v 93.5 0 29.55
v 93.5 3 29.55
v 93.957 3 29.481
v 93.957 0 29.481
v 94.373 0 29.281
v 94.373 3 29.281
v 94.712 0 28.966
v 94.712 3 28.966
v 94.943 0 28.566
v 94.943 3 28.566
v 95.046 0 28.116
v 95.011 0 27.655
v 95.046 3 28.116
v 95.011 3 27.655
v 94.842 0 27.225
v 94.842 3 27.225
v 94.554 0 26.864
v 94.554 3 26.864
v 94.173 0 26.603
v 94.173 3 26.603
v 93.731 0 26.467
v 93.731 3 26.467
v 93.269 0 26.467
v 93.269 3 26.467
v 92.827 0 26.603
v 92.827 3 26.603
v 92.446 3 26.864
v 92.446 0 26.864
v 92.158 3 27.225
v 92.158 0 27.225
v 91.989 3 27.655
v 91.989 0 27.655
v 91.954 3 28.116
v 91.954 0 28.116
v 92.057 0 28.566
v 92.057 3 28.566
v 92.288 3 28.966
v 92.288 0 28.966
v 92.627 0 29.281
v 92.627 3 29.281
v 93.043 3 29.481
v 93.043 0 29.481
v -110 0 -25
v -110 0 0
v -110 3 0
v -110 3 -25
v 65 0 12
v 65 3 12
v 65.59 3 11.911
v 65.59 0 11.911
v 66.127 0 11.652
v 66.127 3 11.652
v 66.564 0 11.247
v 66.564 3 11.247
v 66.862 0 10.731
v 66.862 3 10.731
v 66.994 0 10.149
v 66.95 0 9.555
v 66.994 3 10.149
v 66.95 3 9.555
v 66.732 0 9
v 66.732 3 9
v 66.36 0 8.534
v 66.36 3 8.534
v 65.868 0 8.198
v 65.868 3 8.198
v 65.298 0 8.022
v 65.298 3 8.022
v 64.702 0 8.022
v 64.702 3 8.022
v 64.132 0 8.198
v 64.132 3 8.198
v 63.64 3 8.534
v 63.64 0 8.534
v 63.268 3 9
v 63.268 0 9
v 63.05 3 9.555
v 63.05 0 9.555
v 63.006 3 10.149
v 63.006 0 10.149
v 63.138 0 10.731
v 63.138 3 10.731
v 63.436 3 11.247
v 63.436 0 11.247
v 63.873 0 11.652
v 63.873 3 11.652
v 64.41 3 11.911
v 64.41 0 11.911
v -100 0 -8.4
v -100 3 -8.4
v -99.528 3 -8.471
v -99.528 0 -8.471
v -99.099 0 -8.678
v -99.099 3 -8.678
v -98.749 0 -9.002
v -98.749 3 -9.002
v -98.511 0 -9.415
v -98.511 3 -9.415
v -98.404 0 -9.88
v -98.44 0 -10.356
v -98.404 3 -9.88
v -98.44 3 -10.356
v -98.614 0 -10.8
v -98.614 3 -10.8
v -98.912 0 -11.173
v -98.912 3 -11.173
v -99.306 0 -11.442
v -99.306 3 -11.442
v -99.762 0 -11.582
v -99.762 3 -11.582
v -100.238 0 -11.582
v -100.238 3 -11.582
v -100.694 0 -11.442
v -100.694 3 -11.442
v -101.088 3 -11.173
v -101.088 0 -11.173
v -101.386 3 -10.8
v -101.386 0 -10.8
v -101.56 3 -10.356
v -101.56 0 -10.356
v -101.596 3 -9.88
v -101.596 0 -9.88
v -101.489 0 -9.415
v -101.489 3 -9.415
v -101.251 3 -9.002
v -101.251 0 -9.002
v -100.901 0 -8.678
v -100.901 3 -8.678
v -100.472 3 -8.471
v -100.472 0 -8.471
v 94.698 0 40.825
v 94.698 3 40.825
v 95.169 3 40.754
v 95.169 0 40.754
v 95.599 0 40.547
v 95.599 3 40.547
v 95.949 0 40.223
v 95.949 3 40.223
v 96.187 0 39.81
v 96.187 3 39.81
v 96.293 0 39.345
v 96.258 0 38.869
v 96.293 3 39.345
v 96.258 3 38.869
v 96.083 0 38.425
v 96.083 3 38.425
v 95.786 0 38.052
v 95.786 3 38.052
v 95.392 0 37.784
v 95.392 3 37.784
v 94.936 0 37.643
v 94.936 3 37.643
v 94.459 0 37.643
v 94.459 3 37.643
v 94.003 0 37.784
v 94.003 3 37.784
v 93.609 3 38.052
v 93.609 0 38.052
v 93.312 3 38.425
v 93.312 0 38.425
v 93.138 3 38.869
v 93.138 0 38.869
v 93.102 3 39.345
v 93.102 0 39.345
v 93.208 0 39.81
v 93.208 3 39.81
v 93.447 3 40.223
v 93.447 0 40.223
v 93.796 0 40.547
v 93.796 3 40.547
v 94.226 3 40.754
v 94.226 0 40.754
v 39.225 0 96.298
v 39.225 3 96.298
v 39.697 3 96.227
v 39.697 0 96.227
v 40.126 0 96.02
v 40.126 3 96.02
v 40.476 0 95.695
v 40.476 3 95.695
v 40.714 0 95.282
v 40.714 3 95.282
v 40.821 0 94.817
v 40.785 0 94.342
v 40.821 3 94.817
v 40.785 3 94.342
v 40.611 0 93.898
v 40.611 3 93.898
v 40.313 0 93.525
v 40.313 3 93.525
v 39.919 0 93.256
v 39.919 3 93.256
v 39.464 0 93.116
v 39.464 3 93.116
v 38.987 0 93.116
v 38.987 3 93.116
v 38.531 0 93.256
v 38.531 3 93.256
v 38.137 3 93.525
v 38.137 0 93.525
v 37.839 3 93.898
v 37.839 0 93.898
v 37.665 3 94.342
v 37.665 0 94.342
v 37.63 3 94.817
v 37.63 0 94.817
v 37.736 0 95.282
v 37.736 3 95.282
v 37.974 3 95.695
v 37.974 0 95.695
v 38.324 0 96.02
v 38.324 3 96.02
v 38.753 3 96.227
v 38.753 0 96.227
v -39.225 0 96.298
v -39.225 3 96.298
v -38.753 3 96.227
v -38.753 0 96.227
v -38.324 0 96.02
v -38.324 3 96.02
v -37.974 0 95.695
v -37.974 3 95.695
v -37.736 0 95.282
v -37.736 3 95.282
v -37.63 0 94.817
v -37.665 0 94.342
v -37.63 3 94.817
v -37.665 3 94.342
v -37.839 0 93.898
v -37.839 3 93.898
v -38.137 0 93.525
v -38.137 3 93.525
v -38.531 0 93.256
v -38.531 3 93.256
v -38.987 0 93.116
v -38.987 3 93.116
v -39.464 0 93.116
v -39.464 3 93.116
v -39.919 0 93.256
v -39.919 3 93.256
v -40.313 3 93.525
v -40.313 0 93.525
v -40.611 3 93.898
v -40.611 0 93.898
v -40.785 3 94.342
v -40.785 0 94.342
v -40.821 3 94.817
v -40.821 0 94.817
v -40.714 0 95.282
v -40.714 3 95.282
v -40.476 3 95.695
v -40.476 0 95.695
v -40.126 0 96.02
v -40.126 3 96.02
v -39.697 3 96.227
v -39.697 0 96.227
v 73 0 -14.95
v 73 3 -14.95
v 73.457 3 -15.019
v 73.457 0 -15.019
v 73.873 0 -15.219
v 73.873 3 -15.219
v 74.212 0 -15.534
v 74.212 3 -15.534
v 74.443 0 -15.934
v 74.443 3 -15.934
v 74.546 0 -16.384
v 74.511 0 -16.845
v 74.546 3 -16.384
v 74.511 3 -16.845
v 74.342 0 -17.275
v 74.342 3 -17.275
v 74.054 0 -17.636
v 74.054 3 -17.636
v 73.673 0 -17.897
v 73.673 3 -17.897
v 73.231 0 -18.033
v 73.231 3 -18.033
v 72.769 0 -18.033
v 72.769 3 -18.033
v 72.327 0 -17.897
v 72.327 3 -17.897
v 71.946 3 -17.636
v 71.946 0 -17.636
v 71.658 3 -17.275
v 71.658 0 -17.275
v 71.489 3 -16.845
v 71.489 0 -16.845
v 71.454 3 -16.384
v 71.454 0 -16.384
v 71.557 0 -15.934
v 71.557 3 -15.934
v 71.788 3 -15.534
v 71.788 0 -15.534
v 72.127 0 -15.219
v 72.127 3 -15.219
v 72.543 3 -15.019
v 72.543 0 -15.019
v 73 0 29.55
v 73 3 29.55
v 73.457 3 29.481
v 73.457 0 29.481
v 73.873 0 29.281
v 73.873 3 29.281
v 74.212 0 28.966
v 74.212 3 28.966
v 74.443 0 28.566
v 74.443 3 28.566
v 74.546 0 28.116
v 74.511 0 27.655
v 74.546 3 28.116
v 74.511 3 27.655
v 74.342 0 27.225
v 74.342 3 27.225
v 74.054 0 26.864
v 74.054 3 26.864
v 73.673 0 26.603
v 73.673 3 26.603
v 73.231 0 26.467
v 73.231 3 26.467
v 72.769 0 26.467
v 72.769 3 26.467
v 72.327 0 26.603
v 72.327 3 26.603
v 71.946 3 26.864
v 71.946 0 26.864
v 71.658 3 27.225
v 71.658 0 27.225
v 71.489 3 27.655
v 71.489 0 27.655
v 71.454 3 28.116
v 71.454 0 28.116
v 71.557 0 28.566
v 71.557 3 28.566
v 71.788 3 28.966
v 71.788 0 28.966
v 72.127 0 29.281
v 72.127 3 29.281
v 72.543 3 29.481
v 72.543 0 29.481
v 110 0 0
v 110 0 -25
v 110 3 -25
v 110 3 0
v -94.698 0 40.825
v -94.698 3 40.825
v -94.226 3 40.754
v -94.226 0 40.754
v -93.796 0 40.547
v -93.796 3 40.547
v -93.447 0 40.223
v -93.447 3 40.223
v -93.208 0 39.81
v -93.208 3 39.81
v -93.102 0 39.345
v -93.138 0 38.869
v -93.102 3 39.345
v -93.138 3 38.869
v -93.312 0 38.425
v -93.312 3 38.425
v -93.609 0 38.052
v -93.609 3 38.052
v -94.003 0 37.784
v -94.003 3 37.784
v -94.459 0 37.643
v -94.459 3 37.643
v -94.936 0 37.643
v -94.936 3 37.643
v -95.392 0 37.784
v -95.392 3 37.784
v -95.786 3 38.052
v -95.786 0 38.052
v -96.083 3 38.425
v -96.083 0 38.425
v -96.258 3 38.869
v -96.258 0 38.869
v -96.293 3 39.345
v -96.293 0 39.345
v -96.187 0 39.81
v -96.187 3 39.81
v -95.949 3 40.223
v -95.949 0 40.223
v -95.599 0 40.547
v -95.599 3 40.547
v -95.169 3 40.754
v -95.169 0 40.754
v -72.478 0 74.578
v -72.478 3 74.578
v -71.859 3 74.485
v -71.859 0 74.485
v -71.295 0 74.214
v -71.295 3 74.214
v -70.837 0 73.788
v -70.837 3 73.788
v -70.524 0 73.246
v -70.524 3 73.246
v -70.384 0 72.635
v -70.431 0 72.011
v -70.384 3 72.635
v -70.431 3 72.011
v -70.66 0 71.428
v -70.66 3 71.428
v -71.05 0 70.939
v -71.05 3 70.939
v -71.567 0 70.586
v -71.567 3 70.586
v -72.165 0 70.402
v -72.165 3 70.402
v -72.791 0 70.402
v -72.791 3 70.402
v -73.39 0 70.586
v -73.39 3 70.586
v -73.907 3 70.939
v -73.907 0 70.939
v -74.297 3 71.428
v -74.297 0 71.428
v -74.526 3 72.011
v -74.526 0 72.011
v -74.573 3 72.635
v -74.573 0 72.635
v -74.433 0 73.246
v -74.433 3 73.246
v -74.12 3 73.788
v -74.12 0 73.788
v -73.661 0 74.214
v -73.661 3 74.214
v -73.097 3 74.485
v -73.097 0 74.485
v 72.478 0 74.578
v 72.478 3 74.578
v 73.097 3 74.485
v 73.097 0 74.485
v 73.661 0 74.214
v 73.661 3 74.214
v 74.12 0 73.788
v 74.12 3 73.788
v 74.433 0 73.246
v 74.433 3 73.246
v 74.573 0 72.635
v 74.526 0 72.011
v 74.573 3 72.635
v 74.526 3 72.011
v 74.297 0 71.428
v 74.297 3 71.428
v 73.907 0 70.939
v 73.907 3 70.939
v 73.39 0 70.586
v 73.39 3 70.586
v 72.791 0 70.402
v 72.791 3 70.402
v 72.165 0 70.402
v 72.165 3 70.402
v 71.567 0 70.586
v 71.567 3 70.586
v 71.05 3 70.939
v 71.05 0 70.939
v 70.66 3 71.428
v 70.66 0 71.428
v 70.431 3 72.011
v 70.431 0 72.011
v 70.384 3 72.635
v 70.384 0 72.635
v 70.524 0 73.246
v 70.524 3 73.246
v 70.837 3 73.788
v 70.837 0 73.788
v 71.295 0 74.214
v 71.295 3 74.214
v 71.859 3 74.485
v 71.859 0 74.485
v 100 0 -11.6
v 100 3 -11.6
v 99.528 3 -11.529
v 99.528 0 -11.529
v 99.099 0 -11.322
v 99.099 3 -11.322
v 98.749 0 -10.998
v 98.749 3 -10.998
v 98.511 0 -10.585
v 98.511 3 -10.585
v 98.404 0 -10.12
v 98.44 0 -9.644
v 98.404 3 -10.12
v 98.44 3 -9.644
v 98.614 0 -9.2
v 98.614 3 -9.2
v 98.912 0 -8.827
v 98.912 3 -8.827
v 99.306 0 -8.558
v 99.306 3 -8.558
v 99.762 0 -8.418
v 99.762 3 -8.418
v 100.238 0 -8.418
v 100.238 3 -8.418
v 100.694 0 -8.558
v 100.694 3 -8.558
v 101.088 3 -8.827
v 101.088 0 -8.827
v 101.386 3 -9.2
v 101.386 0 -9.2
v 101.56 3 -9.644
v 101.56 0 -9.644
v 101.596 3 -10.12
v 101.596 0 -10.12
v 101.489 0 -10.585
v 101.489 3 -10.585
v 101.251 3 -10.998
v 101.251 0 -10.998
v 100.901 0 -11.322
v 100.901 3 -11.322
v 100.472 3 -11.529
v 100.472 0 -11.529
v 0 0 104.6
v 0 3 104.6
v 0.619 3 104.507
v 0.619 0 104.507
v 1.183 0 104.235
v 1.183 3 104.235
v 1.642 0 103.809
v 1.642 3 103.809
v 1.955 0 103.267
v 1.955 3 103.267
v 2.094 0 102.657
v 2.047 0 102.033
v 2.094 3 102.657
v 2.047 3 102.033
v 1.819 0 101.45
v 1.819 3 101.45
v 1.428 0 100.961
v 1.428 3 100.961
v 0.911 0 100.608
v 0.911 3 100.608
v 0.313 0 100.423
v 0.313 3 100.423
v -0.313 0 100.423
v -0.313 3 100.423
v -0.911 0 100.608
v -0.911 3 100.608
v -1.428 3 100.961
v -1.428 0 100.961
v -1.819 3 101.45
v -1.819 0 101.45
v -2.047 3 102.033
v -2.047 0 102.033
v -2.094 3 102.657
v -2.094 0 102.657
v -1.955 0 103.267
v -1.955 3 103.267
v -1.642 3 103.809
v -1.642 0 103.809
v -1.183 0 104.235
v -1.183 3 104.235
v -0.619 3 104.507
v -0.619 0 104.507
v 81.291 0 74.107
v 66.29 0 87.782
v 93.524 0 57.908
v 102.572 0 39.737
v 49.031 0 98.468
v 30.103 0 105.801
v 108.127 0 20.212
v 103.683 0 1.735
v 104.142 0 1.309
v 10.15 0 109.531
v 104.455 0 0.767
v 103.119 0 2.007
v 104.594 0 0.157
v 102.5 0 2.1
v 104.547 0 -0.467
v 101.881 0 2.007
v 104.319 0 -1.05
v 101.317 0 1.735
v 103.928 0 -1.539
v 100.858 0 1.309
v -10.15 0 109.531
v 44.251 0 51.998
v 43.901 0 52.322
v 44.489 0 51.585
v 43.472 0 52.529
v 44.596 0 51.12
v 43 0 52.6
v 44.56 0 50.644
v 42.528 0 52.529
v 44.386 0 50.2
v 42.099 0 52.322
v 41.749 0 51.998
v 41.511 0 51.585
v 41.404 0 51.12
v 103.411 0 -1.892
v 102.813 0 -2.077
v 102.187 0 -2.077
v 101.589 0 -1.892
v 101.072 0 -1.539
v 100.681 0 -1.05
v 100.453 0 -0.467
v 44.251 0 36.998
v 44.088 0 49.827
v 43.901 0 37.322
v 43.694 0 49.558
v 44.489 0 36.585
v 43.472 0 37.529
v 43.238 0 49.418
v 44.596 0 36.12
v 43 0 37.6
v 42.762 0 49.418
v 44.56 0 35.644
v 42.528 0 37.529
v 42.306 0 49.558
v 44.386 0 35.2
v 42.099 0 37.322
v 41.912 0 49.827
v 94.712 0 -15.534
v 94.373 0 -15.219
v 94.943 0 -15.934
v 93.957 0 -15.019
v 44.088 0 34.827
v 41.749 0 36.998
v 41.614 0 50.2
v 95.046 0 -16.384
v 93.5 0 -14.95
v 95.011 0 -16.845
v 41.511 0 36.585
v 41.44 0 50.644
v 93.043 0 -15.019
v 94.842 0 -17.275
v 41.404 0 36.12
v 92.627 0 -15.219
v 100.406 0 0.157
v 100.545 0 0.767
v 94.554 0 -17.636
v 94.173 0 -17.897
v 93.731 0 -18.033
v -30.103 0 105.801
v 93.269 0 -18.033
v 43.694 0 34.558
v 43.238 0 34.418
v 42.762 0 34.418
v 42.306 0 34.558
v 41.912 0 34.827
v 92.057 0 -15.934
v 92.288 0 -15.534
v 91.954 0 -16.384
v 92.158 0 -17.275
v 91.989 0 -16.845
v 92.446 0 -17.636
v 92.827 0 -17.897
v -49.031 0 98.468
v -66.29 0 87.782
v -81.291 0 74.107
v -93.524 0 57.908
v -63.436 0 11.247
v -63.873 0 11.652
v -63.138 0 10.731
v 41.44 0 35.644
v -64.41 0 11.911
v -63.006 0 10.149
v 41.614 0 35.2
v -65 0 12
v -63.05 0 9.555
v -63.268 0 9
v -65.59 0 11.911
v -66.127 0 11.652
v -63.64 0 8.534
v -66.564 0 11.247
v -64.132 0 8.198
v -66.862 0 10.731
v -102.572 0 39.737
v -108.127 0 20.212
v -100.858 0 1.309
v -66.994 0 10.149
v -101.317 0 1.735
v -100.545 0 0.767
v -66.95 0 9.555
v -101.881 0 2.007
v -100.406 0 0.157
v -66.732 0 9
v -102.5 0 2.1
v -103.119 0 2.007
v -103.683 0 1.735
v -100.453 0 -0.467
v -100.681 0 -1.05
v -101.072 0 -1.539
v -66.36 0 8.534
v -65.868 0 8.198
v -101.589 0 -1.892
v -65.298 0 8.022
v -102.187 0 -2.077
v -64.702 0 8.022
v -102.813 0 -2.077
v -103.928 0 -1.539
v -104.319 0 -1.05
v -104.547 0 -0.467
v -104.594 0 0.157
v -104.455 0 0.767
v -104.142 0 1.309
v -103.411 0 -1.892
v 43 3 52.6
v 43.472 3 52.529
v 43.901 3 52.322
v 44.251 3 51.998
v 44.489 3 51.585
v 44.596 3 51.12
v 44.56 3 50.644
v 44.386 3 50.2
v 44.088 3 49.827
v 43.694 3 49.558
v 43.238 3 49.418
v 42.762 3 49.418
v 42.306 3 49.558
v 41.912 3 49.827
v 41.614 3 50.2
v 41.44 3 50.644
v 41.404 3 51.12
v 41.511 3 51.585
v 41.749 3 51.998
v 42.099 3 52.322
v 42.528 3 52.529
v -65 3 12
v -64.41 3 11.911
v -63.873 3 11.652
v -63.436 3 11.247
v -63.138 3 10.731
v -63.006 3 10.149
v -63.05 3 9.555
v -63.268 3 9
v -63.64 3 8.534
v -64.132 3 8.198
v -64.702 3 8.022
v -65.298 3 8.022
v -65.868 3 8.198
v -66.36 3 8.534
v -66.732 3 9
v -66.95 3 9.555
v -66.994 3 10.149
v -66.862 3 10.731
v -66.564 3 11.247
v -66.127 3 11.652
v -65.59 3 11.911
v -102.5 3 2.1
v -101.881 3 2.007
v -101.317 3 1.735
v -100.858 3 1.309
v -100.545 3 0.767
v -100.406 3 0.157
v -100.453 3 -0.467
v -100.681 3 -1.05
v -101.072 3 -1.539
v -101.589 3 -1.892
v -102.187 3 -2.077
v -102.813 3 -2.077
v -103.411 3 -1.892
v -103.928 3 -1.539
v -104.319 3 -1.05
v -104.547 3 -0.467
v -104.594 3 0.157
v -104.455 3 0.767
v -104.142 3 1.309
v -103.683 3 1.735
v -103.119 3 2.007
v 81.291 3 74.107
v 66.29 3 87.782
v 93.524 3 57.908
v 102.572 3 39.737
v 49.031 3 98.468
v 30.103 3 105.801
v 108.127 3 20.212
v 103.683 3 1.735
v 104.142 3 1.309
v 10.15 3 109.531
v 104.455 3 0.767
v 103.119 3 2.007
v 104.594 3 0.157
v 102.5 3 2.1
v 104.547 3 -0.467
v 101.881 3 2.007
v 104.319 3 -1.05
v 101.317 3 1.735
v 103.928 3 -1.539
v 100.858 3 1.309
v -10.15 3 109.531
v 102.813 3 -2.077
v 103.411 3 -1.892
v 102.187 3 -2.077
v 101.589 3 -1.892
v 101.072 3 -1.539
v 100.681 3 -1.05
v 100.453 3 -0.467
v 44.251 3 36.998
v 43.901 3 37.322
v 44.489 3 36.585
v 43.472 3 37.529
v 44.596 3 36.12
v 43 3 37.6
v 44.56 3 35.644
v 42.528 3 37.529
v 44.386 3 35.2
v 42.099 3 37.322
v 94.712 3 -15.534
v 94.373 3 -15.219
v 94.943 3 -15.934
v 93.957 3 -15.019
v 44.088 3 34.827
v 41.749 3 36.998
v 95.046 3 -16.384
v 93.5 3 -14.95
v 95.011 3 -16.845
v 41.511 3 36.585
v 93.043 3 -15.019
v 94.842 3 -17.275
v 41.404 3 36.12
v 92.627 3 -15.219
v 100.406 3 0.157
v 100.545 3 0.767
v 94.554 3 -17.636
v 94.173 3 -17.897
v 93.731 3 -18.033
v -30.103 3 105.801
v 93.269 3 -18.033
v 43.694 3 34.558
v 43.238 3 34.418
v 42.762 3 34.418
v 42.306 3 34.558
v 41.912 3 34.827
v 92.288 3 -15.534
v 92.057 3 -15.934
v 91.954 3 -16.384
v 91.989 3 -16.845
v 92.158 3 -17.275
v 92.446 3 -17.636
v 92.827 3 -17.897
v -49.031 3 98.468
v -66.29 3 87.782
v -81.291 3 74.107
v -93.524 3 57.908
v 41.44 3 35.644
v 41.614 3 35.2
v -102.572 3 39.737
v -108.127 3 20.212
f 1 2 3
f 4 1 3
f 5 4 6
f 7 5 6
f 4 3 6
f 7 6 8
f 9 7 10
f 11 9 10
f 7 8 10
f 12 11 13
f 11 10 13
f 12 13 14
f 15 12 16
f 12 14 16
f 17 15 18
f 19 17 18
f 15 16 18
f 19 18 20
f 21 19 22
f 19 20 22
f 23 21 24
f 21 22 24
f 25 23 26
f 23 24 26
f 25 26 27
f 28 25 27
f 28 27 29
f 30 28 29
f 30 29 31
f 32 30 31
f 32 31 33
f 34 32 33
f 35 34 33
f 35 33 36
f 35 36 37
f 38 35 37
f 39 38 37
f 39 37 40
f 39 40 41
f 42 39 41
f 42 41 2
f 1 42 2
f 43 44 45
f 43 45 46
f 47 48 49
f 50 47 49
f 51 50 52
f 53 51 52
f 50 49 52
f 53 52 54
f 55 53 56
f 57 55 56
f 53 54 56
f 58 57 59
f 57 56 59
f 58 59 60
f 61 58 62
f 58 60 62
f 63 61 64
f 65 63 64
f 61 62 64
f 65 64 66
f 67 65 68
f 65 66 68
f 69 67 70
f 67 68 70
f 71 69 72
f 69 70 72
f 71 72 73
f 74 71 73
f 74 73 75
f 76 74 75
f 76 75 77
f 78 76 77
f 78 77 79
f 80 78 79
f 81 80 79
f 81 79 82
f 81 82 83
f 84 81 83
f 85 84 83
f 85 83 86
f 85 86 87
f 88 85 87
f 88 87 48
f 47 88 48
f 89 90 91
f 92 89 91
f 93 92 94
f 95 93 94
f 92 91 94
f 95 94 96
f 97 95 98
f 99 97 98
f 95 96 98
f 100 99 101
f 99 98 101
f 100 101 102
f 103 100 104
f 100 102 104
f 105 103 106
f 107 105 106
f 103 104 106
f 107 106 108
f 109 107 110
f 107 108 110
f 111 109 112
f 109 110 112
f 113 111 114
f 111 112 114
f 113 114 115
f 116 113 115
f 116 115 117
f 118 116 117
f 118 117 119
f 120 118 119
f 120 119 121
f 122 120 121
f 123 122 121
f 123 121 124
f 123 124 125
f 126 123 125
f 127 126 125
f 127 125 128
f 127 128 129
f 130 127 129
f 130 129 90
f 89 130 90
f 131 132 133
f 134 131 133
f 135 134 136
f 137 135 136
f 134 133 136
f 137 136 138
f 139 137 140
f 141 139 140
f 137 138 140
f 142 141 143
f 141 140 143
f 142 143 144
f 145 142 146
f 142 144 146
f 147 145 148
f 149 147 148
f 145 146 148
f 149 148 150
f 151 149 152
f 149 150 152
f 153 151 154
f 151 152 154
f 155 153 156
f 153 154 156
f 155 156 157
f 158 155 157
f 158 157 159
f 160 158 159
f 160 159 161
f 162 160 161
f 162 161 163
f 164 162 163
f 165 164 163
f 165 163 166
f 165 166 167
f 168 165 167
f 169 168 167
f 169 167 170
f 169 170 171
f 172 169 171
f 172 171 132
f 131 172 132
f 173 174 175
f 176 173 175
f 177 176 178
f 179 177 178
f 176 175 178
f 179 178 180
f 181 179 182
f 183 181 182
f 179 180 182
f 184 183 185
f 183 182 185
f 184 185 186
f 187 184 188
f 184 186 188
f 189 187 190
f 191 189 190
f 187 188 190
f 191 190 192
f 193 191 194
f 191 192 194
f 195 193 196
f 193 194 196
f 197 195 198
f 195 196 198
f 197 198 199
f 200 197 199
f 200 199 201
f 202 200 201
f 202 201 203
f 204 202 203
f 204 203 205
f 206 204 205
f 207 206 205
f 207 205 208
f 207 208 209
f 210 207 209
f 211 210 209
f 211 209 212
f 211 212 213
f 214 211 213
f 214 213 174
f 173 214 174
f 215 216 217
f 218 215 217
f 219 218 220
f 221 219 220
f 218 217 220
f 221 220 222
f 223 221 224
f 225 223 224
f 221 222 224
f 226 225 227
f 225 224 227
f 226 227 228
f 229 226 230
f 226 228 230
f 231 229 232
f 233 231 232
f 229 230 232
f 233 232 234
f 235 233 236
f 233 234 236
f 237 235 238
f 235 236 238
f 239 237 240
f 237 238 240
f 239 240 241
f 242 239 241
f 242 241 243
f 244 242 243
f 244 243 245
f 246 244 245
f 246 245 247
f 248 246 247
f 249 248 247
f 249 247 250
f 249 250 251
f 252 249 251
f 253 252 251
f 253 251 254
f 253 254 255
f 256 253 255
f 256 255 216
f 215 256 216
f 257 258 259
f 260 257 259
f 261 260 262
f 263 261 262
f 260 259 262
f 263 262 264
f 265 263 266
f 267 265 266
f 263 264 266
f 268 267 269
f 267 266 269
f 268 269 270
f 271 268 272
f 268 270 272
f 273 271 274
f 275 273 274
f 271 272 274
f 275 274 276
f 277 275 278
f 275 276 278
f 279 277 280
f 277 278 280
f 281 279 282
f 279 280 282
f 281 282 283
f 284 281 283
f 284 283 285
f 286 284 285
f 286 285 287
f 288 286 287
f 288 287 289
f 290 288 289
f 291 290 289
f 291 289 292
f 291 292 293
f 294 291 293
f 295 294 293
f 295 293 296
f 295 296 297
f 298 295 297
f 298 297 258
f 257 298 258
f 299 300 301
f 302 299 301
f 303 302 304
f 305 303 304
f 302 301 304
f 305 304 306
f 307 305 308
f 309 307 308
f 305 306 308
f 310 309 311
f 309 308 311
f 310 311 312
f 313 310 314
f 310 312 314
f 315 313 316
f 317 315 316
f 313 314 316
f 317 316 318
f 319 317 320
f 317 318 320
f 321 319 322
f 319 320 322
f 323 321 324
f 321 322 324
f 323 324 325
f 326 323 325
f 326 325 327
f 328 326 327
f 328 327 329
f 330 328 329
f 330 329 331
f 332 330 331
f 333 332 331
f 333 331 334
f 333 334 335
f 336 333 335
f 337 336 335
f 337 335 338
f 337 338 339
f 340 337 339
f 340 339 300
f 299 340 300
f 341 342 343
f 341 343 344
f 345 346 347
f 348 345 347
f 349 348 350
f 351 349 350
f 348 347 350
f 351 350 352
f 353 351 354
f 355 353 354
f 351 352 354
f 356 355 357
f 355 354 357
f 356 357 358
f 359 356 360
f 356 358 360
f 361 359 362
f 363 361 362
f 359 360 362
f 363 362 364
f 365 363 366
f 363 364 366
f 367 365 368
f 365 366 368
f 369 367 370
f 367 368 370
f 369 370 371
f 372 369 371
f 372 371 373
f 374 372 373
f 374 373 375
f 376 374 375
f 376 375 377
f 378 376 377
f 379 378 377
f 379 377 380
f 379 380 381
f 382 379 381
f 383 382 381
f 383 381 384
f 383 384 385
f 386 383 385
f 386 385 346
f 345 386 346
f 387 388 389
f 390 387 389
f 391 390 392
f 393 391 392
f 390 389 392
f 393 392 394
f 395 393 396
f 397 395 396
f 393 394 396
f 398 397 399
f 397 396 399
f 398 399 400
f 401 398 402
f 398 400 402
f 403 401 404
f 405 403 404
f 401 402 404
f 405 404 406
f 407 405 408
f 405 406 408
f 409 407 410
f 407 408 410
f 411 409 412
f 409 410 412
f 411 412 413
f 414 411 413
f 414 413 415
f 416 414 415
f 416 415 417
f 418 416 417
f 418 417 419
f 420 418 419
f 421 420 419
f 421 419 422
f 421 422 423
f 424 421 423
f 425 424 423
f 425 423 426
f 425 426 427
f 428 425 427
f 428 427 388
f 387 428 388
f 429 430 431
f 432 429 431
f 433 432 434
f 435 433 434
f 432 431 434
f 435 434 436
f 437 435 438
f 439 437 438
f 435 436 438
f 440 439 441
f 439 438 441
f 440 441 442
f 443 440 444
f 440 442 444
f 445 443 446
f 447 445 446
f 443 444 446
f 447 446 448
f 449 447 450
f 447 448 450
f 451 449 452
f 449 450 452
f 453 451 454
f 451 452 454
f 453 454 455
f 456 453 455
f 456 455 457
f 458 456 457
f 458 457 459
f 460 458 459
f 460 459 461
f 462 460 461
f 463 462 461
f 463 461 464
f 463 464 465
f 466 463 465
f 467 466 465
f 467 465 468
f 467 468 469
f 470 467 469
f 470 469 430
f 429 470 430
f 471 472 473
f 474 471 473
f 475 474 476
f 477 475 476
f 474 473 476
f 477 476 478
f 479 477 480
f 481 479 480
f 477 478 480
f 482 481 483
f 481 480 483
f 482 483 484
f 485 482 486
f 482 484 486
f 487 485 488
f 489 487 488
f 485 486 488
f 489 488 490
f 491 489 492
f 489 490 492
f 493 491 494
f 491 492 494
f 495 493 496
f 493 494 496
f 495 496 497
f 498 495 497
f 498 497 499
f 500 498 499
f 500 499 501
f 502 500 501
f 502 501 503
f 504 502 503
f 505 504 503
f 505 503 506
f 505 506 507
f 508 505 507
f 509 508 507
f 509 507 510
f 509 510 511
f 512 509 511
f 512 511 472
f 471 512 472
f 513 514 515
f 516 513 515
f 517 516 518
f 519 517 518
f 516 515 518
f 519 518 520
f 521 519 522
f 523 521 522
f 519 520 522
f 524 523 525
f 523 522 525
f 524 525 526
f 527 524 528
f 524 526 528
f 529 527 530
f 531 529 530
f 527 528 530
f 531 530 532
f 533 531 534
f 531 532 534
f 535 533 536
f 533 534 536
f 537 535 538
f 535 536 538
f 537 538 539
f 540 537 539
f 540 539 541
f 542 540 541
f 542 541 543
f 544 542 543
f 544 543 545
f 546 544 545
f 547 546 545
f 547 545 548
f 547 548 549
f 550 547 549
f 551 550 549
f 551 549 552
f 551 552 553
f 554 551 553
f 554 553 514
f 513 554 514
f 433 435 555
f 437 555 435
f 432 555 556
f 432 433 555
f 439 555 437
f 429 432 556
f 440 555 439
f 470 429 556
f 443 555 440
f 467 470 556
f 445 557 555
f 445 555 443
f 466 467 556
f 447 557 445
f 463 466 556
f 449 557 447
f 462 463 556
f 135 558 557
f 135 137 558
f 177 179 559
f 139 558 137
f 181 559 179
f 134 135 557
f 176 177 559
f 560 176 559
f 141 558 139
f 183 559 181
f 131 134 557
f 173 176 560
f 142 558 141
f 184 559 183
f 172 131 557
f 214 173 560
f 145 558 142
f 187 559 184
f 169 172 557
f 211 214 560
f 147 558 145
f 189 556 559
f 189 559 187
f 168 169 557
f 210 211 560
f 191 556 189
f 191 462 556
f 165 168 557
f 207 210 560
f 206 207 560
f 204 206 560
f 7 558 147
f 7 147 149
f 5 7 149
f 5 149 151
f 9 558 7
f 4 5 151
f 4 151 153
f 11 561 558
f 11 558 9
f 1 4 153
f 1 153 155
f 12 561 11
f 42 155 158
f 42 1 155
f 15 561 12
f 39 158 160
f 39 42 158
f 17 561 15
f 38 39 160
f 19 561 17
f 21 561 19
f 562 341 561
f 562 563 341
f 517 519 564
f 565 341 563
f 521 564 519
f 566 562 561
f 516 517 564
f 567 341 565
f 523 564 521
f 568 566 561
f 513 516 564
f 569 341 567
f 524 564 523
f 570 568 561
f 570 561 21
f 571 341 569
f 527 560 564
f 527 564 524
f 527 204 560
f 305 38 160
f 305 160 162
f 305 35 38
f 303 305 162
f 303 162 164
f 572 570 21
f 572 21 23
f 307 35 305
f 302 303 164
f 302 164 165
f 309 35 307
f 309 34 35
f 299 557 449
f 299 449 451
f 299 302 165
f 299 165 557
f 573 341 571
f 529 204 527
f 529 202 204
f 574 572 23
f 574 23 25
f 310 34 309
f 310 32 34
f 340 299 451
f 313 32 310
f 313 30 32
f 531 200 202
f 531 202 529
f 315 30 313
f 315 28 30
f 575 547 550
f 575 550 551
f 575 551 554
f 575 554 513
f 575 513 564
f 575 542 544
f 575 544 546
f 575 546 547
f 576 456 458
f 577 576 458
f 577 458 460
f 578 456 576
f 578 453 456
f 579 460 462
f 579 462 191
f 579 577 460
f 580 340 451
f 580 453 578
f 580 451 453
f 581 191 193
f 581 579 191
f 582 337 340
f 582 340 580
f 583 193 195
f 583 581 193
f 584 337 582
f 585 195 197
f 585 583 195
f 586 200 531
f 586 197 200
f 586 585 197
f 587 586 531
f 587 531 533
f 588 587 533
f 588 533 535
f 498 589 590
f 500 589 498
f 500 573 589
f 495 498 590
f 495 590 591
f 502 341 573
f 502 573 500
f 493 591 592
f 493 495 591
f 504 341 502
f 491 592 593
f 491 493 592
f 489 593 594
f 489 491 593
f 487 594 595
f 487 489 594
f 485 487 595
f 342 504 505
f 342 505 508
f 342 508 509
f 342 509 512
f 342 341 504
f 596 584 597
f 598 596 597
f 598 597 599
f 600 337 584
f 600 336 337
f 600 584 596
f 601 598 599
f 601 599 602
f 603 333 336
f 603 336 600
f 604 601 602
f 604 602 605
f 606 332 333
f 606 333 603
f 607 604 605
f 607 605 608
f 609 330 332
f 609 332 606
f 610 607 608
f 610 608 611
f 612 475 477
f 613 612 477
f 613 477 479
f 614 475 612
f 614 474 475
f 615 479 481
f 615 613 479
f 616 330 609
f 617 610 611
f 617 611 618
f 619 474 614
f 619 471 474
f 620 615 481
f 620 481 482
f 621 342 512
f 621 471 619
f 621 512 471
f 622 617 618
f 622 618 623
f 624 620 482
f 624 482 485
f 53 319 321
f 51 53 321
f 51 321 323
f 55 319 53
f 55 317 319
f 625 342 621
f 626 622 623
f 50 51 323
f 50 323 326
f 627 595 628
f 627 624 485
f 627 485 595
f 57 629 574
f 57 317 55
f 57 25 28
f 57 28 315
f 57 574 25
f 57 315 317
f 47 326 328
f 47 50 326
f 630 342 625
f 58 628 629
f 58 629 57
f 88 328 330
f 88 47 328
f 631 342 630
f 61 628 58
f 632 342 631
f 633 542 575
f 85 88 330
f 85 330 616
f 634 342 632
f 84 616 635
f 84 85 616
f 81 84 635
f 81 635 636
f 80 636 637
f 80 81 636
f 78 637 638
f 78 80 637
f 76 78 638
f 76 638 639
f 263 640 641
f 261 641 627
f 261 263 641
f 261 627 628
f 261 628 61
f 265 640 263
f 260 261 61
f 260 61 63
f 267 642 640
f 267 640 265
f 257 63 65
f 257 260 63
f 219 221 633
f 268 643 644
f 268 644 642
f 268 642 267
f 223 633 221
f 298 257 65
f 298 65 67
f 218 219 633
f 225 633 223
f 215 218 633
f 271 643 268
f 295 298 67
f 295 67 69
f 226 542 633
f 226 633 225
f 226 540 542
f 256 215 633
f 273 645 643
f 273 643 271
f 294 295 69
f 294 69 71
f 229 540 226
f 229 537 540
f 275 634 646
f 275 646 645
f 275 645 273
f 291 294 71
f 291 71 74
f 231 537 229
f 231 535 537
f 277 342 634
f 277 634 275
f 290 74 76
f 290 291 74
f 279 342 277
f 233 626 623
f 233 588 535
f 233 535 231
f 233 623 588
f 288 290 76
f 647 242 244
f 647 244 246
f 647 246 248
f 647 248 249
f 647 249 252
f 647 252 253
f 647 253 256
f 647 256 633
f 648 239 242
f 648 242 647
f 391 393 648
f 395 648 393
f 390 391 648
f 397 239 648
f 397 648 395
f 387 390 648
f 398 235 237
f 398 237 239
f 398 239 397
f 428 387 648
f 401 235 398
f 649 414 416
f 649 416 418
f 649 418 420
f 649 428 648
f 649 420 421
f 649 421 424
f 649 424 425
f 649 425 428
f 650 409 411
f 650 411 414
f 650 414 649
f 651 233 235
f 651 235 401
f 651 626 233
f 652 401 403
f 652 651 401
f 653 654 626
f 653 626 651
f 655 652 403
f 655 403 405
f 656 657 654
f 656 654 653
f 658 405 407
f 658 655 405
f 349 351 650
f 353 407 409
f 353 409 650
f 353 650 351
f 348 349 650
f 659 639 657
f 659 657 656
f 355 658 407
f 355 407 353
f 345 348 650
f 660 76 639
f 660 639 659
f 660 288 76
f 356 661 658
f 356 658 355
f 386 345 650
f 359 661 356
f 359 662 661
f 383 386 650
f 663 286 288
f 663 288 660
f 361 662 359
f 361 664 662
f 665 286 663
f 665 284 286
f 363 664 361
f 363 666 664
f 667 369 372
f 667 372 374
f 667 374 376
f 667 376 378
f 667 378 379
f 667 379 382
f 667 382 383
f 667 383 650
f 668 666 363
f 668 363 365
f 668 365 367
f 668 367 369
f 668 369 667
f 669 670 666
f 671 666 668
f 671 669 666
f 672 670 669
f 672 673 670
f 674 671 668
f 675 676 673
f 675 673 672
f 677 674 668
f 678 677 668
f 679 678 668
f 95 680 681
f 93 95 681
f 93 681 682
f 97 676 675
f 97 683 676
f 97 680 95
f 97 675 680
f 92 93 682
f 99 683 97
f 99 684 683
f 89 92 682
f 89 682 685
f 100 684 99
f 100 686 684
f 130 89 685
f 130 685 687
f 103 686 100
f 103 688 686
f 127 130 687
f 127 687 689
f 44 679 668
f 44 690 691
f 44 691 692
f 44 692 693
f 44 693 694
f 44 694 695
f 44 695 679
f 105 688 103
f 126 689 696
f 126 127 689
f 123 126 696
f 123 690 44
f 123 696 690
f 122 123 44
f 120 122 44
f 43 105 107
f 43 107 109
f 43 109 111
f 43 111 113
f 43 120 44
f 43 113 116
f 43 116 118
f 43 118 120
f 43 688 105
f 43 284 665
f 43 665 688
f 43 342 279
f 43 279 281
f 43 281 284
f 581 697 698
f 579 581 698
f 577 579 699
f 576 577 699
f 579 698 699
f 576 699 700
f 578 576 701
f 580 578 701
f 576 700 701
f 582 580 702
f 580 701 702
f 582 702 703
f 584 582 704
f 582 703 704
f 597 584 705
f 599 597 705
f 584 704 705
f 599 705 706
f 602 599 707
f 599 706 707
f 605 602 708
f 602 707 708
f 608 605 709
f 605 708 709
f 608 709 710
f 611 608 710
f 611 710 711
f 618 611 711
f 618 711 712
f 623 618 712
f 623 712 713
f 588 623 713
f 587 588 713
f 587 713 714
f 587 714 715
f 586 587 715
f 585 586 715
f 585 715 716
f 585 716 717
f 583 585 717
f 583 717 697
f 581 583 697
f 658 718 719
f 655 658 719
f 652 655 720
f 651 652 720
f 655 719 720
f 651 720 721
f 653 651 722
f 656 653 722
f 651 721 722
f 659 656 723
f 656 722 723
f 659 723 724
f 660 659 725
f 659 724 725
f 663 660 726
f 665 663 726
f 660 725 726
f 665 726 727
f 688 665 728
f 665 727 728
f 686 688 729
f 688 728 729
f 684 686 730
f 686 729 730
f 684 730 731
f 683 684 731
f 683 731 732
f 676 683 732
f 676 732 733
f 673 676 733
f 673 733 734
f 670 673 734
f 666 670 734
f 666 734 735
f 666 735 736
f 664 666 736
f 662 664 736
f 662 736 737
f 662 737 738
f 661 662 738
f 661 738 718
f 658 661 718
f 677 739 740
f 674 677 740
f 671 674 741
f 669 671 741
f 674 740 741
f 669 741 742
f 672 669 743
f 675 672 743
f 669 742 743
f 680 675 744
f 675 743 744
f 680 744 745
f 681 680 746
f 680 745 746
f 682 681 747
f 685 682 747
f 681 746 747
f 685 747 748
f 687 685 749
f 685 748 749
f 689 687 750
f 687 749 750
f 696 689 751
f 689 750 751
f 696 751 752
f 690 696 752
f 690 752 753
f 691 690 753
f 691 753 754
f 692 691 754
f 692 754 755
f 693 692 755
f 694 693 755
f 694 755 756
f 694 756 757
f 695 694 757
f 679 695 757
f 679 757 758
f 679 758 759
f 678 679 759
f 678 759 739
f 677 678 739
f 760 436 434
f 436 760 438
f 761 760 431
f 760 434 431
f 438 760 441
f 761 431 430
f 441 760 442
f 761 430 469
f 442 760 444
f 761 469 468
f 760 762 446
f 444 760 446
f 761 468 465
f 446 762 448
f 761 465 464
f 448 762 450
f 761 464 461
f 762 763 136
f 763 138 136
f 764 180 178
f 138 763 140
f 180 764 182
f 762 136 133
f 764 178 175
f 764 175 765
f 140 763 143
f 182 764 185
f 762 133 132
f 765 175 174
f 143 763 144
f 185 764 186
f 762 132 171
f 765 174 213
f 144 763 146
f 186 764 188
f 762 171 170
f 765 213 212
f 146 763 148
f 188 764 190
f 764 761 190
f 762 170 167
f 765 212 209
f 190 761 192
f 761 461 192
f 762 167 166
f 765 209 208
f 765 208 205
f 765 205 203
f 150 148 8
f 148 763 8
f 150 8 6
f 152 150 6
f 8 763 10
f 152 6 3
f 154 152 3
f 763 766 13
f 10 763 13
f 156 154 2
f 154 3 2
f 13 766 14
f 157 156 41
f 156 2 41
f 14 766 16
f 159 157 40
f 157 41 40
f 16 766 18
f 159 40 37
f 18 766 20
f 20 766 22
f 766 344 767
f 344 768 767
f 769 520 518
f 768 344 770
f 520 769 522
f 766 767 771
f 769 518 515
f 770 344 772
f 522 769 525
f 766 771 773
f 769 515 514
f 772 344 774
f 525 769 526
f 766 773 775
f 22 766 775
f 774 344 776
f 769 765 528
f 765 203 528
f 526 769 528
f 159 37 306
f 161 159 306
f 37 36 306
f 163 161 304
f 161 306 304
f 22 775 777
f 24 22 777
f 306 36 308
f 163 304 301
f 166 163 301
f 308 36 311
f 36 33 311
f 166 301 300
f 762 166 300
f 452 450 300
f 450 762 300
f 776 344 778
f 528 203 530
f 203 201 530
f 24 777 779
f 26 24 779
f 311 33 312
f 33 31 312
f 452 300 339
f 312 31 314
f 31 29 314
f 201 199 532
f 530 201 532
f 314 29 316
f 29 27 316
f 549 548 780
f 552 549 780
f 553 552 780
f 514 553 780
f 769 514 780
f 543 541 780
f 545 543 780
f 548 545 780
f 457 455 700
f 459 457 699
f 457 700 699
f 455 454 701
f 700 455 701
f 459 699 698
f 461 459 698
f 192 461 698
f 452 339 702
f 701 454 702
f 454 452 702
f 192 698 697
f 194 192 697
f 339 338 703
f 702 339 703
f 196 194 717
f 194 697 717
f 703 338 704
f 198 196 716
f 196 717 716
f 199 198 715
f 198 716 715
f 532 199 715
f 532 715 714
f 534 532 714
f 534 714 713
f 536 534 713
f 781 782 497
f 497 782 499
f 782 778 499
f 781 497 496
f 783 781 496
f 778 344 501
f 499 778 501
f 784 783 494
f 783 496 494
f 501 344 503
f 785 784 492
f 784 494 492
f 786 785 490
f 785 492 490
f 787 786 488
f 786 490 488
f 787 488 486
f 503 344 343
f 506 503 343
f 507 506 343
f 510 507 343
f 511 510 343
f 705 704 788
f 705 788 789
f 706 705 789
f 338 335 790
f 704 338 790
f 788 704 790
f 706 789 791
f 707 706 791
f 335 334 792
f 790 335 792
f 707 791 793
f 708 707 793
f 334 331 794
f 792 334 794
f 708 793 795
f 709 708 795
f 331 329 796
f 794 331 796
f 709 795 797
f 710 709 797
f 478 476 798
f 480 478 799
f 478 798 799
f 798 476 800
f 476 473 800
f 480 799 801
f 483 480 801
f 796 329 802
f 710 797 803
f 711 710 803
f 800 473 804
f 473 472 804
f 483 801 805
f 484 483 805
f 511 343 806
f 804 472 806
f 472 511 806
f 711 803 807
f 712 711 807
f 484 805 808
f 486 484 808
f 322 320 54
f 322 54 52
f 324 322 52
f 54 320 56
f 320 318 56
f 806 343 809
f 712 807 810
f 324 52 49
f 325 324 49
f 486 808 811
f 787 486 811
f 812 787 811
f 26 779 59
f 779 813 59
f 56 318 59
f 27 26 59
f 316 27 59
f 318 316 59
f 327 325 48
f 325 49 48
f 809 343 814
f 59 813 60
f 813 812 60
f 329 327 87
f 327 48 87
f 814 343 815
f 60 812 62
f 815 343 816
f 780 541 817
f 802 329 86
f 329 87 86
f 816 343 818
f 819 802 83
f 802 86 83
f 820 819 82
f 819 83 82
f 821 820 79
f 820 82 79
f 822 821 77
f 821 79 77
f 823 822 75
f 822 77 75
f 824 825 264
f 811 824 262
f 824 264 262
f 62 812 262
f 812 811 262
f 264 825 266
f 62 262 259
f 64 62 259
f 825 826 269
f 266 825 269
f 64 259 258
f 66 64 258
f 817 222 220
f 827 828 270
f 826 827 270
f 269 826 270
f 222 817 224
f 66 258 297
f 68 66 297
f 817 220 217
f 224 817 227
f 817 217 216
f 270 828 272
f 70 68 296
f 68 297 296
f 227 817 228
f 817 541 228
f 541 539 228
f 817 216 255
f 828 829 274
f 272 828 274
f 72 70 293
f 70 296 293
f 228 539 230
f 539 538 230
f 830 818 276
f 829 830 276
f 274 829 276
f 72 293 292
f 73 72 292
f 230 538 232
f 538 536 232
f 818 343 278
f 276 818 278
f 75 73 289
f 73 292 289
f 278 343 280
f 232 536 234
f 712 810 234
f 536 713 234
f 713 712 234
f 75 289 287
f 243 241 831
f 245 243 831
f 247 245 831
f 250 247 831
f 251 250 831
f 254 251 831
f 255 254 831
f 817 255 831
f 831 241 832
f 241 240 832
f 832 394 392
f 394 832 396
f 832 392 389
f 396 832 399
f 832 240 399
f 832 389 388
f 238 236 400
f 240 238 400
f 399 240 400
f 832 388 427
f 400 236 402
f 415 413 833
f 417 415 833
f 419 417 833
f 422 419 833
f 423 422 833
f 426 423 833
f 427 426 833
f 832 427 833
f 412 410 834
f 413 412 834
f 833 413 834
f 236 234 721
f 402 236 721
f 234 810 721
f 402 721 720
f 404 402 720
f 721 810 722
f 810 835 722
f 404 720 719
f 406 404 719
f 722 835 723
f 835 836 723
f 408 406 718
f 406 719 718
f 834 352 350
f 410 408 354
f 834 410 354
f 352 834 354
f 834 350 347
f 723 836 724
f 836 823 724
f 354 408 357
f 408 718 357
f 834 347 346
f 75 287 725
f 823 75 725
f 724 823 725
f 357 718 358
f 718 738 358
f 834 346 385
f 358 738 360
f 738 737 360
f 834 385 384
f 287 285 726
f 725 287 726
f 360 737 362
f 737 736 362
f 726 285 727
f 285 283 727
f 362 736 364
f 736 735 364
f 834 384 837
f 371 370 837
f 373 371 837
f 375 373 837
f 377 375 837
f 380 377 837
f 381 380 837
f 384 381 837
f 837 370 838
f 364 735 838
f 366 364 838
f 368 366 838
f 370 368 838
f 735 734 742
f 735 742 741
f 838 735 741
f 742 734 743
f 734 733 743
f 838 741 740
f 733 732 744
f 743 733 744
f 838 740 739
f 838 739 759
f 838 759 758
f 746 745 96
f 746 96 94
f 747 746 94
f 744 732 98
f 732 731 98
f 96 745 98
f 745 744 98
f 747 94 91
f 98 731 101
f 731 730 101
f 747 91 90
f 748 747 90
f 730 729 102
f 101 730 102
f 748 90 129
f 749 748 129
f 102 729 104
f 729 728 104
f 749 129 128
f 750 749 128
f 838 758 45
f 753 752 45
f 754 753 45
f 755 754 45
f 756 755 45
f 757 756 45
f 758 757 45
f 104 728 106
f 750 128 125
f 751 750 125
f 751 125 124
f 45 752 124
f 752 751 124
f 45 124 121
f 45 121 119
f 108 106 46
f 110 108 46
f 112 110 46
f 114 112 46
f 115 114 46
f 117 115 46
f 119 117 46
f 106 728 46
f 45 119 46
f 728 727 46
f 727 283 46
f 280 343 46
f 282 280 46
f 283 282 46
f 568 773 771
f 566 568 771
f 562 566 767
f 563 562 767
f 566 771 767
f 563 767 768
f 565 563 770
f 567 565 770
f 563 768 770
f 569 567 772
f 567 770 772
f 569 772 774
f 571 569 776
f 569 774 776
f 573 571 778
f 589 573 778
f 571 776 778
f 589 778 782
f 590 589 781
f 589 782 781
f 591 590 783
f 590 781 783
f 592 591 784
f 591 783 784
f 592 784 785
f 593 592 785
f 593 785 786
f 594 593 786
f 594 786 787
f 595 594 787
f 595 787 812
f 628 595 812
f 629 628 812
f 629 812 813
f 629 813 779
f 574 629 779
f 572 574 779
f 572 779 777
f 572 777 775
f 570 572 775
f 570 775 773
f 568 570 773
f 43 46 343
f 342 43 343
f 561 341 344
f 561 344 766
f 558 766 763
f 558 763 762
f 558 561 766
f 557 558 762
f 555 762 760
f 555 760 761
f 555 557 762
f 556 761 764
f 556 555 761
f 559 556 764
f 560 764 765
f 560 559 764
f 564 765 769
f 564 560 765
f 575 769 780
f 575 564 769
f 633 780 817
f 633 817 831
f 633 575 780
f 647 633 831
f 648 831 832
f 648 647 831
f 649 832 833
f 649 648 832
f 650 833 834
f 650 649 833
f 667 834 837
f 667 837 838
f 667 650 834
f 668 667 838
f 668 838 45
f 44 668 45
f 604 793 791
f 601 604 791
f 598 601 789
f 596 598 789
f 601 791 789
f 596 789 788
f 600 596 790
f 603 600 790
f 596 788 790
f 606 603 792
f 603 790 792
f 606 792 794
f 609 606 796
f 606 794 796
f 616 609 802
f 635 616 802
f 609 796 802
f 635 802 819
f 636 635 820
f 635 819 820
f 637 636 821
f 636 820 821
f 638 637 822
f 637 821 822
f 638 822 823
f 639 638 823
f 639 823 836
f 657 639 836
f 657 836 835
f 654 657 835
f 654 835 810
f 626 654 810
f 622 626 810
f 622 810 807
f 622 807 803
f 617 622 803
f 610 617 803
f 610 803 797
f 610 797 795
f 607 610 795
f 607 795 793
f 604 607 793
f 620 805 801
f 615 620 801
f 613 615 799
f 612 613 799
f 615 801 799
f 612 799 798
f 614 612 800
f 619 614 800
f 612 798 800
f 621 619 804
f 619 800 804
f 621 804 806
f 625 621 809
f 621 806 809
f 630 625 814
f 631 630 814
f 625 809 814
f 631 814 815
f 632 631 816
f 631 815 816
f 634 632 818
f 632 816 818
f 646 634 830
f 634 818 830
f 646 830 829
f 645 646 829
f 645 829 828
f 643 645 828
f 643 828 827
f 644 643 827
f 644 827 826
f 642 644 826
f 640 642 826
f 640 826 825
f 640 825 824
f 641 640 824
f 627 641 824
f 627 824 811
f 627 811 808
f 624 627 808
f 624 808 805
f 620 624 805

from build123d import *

# Parameters (mm, degrees)
EXTRUDE_1_DEPTH     = 3
SKETCH_2_W          = 220
SKETCH_2_H          = 200
CUT_EXTRUDE_1_DEPTH = 167.535281547
SKETCH_3_R          = 2
SKETCH_3_R_2        = 2.1
SKETCH_3_R_3        = 1.6
CUT_EXTRUDE_2_DEPTH = 10
SKETCH_4_R          = 1.6
CUT_EXTRUDE_3_DEPTH = 156.592416268
SKETCH_4_3_R        = 1.6
SKETCH_4_3_R_2      = 1.55
CUT_EXTRUDE_4_DEPTH = 10


with BuildPart() as part:
    # 草图1 → 凸台-拉伸1 (new body)
    with BuildSketch(Plane(origin=(0, 0, 0), x_dir=(1, 0, 0), z_dir=(0, 1, 0))):
        with BuildLine():
            Line((-110, 0), (-110, 125))
            Line((-110, 125), (110, 125))
            Line((110, 125), (110, 0))
            ThreePointArc((110, 0), (0, -110), (-110, 0))
        make_face()
    extrude(amount=EXTRUDE_1_DEPTH)

    # 草图2 → 切除-拉伸1 (cut, through all)
    with BuildSketch(Plane(origin=(0, 3, 0), x_dir=(1, 0, 0), z_dir=(0, 1, 0))):
        with Locations((0, 125)):
            Rectangle(SKETCH_2_W, SKETCH_2_H)
    extrude(amount=-CUT_EXTRUDE_1_DEPTH, mode=Mode.SUBTRACT)

    # 草图3 → 切除-拉伸2 (cut)
    with BuildSketch(Plane(origin=(0, 3, 0), x_dir=(1, 0, 0), z_dir=(0, 1, 0))):
        with Locations((-65, -10)):
            Circle(SKETCH_3_R)
        with Locations((65, -10)):
            Circle(SKETCH_3_R)
        with Locations((0, -102.5)):
            Circle(SKETCH_3_R_2)
        with Locations((-72.478445072, -72.478445072)):
            Circle(SKETCH_3_R_2)
        with Locations((-102.5, 0)):
            Circle(SKETCH_3_R_2)
        with Locations((102.5, 0)):
            Circle(SKETCH_3_R_2)
        with Locations((72.478445072, -72.478445072)):
            Circle(SKETCH_3_R_2)
        with Locations((-94.697652082, -39.225051817)):
            Circle(SKETCH_3_R_3)
        with Locations((94.697652082, -39.225051817)):
            Circle(SKETCH_3_R_3)
        with Locations((39.225051817, -94.697652082)):
            Circle(SKETCH_3_R_3)
        with Locations((-39.225051817, -94.697652082)):
            Circle(SKETCH_3_R_3)
    extrude(amount=-CUT_EXTRUDE_2_DEPTH, mode=Mode.SUBTRACT)

    # 草图4 → 切除-拉伸3 (cut, through all)
    with BuildSketch(Plane(origin=(0, 3, 0), x_dir=(1, 0, 0), z_dir=(0, 1, 0))):
        with Locations((-100, 10)):
            Circle(SKETCH_4_R)
        with Locations((100, 10)):
            Circle(SKETCH_4_R)
    extrude(amount=-CUT_EXTRUDE_3_DEPTH, mode=Mode.SUBTRACT)

    # 草图4<3> → 切除-拉伸4 (cut)
    with BuildSketch(Plane(origin=(0, 3, 0), x_dir=(1, 0, 0), z_dir=(0, 1, 0))):
        with Locations((-100, 10)):
            Circle(SKETCH_4_3_R)
        with Locations((100, 10)):
            Circle(SKETCH_4_3_R)
        with Locations((43, -36)):
            Circle(SKETCH_4_3_R)
        with Locations((43, -51)):
            Circle(SKETCH_4_3_R)
        with Locations((73, -28)):
            Circle(SKETCH_4_3_R_2)
        with Locations((93.5, -28)):
            Circle(SKETCH_4_3_R_2)
        with Locations((93.5, 16.5)):
            Circle(SKETCH_4_3_R_2)
        with Locations((73, 16.5)):
            Circle(SKETCH_4_3_R_2)
    extrude(amount=-CUT_EXTRUDE_4_DEPTH, mode=Mode.SUBTRACT)


solid = part.part
